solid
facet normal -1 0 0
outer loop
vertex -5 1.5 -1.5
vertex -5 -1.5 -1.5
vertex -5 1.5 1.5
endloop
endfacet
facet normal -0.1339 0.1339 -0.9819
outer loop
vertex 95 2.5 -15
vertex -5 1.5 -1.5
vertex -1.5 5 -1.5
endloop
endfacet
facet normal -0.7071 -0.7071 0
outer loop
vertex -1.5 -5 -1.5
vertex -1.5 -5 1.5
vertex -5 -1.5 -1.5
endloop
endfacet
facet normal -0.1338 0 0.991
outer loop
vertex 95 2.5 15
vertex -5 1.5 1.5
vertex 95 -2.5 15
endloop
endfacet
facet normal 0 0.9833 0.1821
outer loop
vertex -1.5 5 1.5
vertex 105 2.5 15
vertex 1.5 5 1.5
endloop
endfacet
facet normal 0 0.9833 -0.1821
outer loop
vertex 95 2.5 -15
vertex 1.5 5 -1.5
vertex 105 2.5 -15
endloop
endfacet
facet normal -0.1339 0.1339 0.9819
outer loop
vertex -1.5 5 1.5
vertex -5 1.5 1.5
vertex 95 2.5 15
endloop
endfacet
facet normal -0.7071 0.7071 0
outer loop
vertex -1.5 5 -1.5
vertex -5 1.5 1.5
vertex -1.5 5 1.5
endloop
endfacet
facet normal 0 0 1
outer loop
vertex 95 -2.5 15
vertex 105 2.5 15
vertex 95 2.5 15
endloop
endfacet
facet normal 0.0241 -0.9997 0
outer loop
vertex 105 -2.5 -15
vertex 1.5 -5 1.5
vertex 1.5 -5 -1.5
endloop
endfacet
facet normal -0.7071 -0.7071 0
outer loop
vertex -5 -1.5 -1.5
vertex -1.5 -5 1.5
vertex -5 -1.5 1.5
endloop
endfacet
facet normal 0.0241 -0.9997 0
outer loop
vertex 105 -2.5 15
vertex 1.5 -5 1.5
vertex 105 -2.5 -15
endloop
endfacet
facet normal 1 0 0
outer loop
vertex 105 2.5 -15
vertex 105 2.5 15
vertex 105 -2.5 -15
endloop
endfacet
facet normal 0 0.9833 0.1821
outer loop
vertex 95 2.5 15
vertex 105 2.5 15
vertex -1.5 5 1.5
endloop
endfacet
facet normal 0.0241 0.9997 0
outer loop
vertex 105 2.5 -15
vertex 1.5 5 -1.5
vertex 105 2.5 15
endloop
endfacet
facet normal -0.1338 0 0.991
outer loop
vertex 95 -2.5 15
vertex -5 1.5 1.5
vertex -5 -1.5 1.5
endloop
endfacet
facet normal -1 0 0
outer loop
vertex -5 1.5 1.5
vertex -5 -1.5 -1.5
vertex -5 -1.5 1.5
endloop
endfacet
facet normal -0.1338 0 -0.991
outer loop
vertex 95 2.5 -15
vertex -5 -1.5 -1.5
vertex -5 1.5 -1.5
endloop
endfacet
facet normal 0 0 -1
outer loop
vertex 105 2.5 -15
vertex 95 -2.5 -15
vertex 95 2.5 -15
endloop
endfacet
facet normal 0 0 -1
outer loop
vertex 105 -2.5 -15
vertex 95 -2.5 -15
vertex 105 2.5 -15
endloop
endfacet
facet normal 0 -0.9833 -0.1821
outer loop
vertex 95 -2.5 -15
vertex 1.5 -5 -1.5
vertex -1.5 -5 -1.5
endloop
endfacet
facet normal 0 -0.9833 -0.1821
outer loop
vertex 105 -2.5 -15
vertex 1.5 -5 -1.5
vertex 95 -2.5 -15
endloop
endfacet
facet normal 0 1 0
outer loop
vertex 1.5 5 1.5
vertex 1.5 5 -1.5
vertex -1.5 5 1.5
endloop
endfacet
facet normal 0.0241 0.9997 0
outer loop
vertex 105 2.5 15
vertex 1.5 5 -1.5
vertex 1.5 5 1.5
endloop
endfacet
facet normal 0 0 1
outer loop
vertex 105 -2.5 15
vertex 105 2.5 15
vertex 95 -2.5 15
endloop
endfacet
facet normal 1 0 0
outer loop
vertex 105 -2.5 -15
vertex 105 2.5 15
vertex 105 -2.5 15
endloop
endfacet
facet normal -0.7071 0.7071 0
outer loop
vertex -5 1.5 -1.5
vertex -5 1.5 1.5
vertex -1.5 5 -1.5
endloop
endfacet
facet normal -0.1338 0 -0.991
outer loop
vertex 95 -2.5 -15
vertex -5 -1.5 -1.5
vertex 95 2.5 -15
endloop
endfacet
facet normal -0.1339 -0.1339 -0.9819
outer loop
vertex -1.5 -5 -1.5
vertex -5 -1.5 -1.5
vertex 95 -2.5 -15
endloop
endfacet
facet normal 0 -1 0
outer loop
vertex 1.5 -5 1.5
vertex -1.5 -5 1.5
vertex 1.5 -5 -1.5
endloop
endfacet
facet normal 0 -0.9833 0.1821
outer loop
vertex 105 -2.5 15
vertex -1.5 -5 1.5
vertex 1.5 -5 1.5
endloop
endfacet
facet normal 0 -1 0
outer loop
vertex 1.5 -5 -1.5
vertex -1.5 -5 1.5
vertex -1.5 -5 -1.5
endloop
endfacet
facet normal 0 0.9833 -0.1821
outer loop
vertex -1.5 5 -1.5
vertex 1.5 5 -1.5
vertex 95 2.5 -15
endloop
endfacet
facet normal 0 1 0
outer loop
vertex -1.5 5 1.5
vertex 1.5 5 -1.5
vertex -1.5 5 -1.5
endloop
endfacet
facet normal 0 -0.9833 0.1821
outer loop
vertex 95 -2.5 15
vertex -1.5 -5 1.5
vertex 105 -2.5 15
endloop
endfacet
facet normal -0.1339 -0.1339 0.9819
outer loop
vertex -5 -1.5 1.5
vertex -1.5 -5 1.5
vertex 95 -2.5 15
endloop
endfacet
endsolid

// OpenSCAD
/*
intersection(){

sphere(d = 7, $fn = 100);

intersection_for(i = [0:10-1]){
	rotate([0,0,360*i/10])
	cube(size = 5, center =  true);
	}
}
*/
/*
intersection_for(i = [0:30-1]){
	rotate([0,0,360*i/30])
	cube(size = 5, center =  true);
	}
	
	//sphere(d = 7, $fn = 100);
*/
/*
s = 5;
intersection_for(q = [0:s-1]){
rotate([0,0,360*q/s])
translate([5,0,0])
sphere(r = 10, $fn = 100);
}
*/





hull(){

cube([10,3,3], center = true);
cube([3,10,3], center = true);

rotate([0,-360*$t,0])
translate([100,0,0])
cube([10, 5, 30], center = true);
}
